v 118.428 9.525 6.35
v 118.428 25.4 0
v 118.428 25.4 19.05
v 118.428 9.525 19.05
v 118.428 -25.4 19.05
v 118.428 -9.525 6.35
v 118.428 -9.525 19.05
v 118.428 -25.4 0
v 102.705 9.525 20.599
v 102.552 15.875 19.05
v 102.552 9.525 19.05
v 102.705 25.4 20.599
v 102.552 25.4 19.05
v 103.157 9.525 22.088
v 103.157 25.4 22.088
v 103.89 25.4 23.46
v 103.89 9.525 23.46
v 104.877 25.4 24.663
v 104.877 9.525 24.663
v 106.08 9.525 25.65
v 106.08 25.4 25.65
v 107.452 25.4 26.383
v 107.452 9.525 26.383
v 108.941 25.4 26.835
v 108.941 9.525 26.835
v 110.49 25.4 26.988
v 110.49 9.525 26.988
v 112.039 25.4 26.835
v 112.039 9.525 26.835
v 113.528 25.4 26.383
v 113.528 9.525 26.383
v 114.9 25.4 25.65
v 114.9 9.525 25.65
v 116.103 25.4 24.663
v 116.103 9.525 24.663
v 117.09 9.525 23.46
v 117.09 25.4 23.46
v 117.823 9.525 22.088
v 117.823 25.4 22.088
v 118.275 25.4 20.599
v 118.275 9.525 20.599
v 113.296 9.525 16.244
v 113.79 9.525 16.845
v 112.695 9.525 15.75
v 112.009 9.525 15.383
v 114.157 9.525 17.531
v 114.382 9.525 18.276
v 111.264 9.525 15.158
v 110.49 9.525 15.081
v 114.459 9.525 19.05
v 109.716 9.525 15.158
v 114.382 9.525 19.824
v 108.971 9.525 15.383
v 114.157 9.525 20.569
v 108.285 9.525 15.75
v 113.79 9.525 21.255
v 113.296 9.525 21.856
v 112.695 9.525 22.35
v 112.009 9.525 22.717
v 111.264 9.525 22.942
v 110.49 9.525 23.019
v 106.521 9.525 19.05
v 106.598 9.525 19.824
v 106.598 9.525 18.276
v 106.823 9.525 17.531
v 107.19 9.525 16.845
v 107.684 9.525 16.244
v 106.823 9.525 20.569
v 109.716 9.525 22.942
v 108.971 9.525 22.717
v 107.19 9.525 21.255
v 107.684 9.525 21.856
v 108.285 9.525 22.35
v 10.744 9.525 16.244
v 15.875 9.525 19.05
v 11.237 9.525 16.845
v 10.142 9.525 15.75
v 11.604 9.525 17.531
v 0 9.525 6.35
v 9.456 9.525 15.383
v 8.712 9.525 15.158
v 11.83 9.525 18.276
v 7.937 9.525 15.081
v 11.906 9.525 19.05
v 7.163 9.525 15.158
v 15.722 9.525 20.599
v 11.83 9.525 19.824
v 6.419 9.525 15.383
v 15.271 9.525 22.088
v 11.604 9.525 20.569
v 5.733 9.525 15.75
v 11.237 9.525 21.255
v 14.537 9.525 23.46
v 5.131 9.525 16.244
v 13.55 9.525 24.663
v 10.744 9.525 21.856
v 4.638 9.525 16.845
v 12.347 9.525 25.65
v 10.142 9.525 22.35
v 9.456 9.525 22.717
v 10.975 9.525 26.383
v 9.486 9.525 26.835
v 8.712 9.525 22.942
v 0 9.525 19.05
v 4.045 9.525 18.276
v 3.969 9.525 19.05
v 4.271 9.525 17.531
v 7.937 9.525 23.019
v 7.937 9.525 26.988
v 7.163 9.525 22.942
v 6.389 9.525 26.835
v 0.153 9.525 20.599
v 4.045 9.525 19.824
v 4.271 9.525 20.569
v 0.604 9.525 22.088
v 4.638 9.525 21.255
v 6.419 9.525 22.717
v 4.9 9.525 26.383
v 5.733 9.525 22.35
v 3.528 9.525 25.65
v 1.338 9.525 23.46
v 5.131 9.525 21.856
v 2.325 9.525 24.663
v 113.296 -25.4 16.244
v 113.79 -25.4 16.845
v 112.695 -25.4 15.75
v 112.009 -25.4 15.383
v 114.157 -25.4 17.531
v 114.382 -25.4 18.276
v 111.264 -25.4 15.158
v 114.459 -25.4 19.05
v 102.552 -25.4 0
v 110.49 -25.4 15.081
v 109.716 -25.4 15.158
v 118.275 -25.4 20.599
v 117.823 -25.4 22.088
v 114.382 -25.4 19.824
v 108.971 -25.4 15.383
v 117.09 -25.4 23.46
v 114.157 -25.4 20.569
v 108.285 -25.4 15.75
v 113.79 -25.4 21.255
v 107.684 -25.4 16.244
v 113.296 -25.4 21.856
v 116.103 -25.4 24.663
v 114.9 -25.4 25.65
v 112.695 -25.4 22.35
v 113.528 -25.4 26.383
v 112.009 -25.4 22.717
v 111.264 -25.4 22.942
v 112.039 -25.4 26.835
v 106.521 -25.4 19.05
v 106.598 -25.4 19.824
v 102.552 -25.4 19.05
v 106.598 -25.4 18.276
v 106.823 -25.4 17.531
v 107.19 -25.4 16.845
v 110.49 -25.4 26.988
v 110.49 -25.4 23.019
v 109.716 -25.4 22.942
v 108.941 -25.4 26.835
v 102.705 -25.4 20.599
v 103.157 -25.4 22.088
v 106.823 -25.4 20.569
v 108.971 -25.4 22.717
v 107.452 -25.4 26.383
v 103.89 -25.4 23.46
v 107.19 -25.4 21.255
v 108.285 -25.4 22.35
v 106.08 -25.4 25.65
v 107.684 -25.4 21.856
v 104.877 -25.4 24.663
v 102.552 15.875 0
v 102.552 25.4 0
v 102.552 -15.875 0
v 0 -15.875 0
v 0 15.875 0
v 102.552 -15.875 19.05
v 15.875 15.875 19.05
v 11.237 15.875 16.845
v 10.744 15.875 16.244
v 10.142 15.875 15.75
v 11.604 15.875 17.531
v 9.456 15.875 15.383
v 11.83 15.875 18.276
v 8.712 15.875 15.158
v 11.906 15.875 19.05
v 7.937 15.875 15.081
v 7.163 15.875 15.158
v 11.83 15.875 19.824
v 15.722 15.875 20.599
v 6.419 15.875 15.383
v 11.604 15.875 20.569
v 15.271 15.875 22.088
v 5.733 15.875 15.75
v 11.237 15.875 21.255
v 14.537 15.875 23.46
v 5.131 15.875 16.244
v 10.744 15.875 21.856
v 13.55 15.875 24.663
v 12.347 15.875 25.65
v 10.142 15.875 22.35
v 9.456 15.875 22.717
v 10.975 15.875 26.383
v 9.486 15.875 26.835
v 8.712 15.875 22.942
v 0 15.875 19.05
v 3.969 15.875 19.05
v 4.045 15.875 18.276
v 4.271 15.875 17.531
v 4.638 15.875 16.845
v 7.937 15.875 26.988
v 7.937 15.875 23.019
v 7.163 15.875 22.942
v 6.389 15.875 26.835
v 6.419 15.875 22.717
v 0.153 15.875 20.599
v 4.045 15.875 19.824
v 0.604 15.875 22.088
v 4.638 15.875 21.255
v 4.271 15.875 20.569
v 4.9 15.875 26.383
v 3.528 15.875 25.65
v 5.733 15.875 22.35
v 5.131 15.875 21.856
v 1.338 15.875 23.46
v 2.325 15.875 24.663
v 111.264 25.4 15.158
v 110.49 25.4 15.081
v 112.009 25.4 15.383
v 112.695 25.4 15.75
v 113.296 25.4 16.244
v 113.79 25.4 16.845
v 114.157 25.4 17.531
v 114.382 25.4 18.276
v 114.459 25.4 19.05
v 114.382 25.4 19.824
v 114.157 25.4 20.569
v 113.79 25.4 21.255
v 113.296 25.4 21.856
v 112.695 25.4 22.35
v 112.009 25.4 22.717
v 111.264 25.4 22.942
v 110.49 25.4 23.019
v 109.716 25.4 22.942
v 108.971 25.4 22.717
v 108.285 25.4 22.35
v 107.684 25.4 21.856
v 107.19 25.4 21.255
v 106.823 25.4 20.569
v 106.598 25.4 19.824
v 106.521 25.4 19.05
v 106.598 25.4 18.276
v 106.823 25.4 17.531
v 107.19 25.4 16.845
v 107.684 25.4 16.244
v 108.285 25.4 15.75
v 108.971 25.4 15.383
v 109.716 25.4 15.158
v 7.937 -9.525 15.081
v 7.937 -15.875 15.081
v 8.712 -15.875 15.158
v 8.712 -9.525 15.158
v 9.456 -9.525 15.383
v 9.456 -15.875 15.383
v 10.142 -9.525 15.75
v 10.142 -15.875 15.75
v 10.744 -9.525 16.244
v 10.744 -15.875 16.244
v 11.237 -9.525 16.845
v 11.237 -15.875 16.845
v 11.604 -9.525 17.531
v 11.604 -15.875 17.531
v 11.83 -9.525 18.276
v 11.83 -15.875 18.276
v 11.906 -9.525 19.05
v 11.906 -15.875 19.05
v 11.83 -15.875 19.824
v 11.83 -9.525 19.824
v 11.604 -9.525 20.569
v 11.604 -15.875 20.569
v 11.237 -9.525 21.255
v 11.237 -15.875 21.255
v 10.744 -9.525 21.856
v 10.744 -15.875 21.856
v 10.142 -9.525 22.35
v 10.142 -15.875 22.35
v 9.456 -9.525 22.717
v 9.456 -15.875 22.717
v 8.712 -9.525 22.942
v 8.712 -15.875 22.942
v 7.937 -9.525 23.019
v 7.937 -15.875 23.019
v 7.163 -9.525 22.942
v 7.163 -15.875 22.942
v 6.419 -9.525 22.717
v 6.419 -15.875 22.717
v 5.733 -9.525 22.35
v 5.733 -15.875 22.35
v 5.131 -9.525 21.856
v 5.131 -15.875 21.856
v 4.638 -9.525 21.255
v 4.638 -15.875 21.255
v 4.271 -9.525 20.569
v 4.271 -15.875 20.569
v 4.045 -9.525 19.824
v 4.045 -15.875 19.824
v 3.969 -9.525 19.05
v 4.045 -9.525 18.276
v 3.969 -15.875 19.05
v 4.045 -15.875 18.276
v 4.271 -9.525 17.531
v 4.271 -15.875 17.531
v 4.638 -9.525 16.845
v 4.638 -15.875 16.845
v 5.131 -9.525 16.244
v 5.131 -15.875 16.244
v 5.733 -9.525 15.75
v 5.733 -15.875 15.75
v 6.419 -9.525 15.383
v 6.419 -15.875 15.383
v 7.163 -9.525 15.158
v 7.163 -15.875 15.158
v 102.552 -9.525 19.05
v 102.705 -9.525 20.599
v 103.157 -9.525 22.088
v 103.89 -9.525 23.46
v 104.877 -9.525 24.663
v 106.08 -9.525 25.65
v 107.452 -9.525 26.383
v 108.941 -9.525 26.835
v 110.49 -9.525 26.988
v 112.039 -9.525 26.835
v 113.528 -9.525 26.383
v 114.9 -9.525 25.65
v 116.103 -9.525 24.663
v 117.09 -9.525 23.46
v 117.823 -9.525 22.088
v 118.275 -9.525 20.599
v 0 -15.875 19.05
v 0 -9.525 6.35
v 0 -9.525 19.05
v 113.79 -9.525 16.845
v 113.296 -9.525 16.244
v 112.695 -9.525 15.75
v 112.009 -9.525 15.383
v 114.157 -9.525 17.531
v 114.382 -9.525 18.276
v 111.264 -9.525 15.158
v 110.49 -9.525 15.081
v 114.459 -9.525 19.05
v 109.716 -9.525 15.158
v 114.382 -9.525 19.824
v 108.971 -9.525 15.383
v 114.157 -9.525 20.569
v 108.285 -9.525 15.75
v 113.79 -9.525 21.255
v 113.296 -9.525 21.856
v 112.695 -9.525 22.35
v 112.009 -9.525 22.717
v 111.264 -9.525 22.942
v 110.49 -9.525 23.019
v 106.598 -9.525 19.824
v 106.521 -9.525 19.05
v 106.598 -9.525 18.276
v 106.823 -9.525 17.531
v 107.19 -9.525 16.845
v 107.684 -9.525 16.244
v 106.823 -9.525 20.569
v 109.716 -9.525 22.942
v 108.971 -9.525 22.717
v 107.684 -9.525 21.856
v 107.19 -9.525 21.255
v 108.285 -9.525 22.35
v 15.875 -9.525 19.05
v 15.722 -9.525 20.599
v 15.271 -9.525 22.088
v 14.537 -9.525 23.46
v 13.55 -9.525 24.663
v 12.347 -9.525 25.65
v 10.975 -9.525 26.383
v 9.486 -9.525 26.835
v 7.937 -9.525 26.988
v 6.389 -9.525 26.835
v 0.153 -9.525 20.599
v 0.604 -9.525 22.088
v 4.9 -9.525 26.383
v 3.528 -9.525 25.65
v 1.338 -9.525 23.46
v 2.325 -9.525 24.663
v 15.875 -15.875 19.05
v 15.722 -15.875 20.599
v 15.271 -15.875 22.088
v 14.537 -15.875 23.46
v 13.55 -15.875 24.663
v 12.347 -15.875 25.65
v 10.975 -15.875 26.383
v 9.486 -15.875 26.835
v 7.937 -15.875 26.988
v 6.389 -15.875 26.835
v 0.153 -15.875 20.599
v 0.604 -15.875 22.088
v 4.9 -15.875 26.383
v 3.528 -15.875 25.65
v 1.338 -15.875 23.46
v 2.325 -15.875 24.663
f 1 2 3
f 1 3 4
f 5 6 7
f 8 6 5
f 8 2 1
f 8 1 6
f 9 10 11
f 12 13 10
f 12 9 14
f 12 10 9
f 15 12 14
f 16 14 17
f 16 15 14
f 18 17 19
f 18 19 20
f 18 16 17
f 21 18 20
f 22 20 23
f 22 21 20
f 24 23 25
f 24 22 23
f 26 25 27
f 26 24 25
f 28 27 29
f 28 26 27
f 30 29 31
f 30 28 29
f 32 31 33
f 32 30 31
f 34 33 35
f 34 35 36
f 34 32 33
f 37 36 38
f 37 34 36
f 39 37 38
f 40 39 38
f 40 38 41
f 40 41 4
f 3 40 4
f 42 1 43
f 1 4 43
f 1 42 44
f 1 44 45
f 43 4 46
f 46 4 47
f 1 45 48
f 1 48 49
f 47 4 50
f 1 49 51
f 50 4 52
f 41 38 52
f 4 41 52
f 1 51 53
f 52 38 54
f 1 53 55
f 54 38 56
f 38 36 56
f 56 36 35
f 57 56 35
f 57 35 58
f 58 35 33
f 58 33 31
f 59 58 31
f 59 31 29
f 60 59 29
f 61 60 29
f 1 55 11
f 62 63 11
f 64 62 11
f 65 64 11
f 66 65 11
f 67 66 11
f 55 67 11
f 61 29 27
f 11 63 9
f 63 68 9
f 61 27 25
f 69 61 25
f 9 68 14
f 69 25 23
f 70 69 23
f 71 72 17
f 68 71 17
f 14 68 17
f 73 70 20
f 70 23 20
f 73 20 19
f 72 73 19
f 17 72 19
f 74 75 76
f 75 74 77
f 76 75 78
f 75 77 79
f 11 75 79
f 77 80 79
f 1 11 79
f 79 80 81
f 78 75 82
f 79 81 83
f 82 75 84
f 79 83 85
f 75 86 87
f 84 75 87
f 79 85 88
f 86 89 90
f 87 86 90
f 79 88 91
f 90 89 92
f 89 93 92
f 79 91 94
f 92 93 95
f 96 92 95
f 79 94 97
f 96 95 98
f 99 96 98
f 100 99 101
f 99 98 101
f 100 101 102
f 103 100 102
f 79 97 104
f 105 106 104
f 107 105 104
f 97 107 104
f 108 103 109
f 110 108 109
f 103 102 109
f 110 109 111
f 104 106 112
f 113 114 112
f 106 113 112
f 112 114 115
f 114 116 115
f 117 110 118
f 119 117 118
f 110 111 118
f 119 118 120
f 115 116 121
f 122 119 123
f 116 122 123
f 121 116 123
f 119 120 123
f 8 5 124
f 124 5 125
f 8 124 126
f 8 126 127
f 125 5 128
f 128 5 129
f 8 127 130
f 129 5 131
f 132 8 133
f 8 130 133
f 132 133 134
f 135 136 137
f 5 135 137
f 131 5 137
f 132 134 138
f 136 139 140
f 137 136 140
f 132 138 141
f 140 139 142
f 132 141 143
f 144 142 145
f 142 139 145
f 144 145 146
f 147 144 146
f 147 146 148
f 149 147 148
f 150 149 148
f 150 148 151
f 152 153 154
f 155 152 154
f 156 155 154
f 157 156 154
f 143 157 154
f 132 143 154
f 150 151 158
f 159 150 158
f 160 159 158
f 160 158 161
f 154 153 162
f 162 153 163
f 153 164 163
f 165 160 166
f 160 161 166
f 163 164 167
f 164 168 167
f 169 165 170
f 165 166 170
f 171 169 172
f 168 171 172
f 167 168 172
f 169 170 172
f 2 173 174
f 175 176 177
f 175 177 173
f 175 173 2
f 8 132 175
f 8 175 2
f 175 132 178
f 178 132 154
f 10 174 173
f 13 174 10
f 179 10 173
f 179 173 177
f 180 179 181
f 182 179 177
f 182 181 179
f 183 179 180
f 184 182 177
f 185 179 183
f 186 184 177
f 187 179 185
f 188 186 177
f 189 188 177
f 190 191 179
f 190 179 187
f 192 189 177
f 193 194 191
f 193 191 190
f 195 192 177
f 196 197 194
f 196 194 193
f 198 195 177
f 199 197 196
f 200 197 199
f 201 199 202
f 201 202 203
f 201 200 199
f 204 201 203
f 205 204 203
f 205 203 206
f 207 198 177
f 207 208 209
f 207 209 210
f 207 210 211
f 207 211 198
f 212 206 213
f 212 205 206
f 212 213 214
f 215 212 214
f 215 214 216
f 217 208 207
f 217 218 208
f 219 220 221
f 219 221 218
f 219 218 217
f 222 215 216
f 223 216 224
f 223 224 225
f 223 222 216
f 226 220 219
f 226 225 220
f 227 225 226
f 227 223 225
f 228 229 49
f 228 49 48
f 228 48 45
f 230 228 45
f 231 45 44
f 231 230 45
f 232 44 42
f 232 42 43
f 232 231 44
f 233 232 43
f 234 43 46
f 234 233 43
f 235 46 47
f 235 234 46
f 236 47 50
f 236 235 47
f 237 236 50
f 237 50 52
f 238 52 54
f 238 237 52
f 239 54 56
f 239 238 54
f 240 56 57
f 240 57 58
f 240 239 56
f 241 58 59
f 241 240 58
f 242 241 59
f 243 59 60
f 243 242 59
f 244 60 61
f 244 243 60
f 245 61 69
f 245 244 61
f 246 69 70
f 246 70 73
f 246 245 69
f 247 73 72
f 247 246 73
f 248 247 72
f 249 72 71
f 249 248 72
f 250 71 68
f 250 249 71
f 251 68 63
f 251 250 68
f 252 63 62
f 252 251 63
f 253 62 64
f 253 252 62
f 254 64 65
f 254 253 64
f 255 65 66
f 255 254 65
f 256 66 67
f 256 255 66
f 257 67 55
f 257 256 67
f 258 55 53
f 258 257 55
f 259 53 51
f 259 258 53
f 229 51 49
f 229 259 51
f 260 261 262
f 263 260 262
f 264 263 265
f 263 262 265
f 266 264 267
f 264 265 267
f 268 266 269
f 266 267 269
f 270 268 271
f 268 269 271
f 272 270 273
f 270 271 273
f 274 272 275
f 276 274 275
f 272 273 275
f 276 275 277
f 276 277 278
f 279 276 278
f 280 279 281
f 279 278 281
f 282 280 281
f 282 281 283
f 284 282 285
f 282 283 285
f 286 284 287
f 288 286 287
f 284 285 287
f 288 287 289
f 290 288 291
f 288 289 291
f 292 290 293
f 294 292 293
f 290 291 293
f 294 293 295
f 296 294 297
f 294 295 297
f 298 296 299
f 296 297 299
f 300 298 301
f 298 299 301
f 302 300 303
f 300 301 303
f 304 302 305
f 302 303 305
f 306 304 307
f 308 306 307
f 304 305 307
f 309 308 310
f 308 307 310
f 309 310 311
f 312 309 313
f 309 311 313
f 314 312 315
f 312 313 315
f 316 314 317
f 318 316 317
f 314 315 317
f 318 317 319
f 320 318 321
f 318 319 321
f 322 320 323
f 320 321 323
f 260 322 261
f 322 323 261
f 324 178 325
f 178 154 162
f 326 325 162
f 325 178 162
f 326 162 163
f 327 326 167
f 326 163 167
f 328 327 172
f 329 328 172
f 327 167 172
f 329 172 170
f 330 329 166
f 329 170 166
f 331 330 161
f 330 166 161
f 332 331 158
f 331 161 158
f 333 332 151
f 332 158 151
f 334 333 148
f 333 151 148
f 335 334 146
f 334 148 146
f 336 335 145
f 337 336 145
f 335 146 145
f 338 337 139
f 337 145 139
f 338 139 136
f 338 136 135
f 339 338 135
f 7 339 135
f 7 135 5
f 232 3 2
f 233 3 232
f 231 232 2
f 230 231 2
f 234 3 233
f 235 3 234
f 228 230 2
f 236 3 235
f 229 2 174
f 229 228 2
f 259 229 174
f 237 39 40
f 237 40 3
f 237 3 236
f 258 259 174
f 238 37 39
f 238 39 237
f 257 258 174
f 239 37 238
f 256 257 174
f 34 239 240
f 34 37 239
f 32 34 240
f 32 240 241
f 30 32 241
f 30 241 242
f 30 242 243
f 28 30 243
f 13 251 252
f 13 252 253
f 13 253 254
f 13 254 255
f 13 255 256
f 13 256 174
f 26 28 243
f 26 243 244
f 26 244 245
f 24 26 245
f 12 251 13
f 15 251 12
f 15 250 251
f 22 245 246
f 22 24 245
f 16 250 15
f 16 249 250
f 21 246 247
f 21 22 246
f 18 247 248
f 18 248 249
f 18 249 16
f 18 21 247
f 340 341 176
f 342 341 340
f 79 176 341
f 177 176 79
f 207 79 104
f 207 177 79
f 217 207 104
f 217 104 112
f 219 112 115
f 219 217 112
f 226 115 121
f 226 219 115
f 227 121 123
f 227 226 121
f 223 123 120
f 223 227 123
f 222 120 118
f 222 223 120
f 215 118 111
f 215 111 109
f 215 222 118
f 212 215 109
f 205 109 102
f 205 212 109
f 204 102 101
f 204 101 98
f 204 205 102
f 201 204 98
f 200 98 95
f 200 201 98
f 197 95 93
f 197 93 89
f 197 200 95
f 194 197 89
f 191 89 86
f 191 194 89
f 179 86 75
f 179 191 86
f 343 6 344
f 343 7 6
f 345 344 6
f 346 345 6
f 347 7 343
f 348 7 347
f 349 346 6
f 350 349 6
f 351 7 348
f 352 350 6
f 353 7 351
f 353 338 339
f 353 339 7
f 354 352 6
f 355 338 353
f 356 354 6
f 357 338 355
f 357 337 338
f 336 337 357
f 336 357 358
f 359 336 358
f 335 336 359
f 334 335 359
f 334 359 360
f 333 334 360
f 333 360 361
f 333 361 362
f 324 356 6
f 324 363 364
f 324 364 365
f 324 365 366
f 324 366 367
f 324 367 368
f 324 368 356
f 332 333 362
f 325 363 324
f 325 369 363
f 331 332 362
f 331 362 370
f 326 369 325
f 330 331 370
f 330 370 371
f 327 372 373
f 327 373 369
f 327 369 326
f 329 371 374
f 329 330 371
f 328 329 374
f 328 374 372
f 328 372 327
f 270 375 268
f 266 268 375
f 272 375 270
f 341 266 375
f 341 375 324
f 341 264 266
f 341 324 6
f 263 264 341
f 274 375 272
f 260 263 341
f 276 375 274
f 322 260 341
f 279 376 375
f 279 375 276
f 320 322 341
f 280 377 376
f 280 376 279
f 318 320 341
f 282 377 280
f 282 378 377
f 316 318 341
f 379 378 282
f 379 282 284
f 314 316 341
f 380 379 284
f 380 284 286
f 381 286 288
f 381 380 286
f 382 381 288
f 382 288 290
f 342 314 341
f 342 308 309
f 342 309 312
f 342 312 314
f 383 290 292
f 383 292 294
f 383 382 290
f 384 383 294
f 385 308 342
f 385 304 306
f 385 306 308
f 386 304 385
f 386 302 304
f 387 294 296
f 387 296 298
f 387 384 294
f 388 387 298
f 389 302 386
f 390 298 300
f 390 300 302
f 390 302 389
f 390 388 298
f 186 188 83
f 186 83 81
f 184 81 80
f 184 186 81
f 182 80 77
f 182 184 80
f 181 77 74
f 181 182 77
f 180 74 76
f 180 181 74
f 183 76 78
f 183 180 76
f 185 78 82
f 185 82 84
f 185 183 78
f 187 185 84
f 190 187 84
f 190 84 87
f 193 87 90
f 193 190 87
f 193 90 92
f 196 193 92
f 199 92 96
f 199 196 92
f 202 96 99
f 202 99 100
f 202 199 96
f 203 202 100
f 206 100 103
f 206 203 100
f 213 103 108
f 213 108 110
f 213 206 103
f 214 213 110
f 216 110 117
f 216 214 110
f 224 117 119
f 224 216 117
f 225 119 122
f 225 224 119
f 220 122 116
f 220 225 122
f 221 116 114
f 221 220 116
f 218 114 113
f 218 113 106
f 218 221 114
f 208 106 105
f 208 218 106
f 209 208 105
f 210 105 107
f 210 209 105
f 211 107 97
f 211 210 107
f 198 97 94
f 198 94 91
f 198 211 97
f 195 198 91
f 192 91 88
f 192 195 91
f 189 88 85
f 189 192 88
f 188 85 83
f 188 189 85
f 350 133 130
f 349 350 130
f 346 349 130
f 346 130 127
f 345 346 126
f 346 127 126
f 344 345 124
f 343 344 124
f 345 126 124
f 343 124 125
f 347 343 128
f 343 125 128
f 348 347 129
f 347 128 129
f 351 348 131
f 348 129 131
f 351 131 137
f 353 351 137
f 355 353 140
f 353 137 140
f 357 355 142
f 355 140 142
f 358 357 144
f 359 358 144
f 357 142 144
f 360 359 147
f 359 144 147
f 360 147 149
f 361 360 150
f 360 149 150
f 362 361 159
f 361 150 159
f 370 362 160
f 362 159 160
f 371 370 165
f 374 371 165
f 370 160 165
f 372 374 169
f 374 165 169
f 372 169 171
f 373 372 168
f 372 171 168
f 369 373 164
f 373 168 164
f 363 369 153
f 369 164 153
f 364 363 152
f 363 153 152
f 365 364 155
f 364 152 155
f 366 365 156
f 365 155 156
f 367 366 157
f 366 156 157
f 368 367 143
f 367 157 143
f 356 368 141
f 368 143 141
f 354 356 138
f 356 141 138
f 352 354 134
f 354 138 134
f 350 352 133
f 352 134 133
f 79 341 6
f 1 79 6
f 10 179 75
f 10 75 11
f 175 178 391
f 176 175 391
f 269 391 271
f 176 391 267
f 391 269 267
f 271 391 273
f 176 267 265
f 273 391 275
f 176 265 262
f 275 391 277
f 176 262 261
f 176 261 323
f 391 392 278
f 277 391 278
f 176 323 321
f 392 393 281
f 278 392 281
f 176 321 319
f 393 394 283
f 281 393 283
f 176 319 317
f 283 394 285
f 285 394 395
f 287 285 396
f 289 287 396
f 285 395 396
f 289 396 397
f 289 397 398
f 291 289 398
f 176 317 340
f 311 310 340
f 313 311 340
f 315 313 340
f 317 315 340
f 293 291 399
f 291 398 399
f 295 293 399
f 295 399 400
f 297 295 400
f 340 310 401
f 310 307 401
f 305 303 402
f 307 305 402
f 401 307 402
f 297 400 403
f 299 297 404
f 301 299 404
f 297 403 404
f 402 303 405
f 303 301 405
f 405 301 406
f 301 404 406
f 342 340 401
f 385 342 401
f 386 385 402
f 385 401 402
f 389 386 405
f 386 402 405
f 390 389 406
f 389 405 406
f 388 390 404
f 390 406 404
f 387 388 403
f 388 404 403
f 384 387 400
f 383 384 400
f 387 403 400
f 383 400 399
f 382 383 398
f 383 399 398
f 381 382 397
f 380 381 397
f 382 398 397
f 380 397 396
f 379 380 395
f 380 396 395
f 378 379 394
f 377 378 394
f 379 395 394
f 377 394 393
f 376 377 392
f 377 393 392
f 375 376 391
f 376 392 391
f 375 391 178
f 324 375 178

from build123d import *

# Parameters (mm, degrees)
BOSS_EXTRUDE4_DEPTH = 6.35
SKETCH9_R           = 3.96875
BOSS_EXTRUDE5_DEPTH = 15.875
SKETCH10_R          = 3.96875
BOSS_EXTRUDE6_DEPTH = 6.35


with BuildPart() as part:
    # Sketch6 → Boss-Extrude4 (new body)
    with BuildSketch(Plane.XY):
        Polygon((0, 0), (0, -15.875), (102.5525, -15.875), (102.5525, -25.4), (118.4275, -25.4), (118.4275, 0), align=None)
    extrude(amount=BOSS_EXTRUDE4_DEPTH)

    # Sketch9 → Boss-Extrude5 (add)
    with BuildSketch(Plane.XZ.offset(25.4)):
        with BuildLine():
            Line((102.5525, 6.35), (102.5525, 19.05))
            ThreePointArc((102.5525, 19.05), (110.49, 26.9875), (118.4275, 19.05))
            Line((118.4275, 19.05), (118.4275, 6.35))
            Line((118.4275, 6.35), (102.5525, 6.35))
        make_face()
        with Locations(Location((110.49, 19.05, 0), (0, 0, 270))):
            Circle(SKETCH9_R, mode=Mode.SUBTRACT)
    extrude(amount=-BOSS_EXTRUDE5_DEPTH)

    # Sketch10 → Boss-Extrude6 (add)
    with BuildSketch(Plane.XZ.offset(15.875)):
        with BuildLine():
            Line((0, 6.35), (0, 19.05))
            ThreePointArc((0, 19.05), (7.9375, 26.9875), (15.875, 19.05))
            Line((15.875, 19.05), (102.5525, 19.05))
            Line((102.5525, 19.05), (102.5525, 6.35))
            Line((102.5525, 6.35), (0, 6.35))
        make_face()
        with Locations(Location((7.9375, 19.05, 0), (0, 0, 270))):
            Circle(SKETCH10_R, mode=Mode.SUBTRACT)
    extrude(amount=-BOSS_EXTRUDE6_DEPTH)

    # Mirror1: part across plane


with BuildPart() as part_1:
    add(part.part)
    add(part.part.mirror(Plane(origin=(118.4275, 0, 6.35), x_dir=(0, 0, 1), z_dir=(0, -1, 0))))


solid = part_1.part
